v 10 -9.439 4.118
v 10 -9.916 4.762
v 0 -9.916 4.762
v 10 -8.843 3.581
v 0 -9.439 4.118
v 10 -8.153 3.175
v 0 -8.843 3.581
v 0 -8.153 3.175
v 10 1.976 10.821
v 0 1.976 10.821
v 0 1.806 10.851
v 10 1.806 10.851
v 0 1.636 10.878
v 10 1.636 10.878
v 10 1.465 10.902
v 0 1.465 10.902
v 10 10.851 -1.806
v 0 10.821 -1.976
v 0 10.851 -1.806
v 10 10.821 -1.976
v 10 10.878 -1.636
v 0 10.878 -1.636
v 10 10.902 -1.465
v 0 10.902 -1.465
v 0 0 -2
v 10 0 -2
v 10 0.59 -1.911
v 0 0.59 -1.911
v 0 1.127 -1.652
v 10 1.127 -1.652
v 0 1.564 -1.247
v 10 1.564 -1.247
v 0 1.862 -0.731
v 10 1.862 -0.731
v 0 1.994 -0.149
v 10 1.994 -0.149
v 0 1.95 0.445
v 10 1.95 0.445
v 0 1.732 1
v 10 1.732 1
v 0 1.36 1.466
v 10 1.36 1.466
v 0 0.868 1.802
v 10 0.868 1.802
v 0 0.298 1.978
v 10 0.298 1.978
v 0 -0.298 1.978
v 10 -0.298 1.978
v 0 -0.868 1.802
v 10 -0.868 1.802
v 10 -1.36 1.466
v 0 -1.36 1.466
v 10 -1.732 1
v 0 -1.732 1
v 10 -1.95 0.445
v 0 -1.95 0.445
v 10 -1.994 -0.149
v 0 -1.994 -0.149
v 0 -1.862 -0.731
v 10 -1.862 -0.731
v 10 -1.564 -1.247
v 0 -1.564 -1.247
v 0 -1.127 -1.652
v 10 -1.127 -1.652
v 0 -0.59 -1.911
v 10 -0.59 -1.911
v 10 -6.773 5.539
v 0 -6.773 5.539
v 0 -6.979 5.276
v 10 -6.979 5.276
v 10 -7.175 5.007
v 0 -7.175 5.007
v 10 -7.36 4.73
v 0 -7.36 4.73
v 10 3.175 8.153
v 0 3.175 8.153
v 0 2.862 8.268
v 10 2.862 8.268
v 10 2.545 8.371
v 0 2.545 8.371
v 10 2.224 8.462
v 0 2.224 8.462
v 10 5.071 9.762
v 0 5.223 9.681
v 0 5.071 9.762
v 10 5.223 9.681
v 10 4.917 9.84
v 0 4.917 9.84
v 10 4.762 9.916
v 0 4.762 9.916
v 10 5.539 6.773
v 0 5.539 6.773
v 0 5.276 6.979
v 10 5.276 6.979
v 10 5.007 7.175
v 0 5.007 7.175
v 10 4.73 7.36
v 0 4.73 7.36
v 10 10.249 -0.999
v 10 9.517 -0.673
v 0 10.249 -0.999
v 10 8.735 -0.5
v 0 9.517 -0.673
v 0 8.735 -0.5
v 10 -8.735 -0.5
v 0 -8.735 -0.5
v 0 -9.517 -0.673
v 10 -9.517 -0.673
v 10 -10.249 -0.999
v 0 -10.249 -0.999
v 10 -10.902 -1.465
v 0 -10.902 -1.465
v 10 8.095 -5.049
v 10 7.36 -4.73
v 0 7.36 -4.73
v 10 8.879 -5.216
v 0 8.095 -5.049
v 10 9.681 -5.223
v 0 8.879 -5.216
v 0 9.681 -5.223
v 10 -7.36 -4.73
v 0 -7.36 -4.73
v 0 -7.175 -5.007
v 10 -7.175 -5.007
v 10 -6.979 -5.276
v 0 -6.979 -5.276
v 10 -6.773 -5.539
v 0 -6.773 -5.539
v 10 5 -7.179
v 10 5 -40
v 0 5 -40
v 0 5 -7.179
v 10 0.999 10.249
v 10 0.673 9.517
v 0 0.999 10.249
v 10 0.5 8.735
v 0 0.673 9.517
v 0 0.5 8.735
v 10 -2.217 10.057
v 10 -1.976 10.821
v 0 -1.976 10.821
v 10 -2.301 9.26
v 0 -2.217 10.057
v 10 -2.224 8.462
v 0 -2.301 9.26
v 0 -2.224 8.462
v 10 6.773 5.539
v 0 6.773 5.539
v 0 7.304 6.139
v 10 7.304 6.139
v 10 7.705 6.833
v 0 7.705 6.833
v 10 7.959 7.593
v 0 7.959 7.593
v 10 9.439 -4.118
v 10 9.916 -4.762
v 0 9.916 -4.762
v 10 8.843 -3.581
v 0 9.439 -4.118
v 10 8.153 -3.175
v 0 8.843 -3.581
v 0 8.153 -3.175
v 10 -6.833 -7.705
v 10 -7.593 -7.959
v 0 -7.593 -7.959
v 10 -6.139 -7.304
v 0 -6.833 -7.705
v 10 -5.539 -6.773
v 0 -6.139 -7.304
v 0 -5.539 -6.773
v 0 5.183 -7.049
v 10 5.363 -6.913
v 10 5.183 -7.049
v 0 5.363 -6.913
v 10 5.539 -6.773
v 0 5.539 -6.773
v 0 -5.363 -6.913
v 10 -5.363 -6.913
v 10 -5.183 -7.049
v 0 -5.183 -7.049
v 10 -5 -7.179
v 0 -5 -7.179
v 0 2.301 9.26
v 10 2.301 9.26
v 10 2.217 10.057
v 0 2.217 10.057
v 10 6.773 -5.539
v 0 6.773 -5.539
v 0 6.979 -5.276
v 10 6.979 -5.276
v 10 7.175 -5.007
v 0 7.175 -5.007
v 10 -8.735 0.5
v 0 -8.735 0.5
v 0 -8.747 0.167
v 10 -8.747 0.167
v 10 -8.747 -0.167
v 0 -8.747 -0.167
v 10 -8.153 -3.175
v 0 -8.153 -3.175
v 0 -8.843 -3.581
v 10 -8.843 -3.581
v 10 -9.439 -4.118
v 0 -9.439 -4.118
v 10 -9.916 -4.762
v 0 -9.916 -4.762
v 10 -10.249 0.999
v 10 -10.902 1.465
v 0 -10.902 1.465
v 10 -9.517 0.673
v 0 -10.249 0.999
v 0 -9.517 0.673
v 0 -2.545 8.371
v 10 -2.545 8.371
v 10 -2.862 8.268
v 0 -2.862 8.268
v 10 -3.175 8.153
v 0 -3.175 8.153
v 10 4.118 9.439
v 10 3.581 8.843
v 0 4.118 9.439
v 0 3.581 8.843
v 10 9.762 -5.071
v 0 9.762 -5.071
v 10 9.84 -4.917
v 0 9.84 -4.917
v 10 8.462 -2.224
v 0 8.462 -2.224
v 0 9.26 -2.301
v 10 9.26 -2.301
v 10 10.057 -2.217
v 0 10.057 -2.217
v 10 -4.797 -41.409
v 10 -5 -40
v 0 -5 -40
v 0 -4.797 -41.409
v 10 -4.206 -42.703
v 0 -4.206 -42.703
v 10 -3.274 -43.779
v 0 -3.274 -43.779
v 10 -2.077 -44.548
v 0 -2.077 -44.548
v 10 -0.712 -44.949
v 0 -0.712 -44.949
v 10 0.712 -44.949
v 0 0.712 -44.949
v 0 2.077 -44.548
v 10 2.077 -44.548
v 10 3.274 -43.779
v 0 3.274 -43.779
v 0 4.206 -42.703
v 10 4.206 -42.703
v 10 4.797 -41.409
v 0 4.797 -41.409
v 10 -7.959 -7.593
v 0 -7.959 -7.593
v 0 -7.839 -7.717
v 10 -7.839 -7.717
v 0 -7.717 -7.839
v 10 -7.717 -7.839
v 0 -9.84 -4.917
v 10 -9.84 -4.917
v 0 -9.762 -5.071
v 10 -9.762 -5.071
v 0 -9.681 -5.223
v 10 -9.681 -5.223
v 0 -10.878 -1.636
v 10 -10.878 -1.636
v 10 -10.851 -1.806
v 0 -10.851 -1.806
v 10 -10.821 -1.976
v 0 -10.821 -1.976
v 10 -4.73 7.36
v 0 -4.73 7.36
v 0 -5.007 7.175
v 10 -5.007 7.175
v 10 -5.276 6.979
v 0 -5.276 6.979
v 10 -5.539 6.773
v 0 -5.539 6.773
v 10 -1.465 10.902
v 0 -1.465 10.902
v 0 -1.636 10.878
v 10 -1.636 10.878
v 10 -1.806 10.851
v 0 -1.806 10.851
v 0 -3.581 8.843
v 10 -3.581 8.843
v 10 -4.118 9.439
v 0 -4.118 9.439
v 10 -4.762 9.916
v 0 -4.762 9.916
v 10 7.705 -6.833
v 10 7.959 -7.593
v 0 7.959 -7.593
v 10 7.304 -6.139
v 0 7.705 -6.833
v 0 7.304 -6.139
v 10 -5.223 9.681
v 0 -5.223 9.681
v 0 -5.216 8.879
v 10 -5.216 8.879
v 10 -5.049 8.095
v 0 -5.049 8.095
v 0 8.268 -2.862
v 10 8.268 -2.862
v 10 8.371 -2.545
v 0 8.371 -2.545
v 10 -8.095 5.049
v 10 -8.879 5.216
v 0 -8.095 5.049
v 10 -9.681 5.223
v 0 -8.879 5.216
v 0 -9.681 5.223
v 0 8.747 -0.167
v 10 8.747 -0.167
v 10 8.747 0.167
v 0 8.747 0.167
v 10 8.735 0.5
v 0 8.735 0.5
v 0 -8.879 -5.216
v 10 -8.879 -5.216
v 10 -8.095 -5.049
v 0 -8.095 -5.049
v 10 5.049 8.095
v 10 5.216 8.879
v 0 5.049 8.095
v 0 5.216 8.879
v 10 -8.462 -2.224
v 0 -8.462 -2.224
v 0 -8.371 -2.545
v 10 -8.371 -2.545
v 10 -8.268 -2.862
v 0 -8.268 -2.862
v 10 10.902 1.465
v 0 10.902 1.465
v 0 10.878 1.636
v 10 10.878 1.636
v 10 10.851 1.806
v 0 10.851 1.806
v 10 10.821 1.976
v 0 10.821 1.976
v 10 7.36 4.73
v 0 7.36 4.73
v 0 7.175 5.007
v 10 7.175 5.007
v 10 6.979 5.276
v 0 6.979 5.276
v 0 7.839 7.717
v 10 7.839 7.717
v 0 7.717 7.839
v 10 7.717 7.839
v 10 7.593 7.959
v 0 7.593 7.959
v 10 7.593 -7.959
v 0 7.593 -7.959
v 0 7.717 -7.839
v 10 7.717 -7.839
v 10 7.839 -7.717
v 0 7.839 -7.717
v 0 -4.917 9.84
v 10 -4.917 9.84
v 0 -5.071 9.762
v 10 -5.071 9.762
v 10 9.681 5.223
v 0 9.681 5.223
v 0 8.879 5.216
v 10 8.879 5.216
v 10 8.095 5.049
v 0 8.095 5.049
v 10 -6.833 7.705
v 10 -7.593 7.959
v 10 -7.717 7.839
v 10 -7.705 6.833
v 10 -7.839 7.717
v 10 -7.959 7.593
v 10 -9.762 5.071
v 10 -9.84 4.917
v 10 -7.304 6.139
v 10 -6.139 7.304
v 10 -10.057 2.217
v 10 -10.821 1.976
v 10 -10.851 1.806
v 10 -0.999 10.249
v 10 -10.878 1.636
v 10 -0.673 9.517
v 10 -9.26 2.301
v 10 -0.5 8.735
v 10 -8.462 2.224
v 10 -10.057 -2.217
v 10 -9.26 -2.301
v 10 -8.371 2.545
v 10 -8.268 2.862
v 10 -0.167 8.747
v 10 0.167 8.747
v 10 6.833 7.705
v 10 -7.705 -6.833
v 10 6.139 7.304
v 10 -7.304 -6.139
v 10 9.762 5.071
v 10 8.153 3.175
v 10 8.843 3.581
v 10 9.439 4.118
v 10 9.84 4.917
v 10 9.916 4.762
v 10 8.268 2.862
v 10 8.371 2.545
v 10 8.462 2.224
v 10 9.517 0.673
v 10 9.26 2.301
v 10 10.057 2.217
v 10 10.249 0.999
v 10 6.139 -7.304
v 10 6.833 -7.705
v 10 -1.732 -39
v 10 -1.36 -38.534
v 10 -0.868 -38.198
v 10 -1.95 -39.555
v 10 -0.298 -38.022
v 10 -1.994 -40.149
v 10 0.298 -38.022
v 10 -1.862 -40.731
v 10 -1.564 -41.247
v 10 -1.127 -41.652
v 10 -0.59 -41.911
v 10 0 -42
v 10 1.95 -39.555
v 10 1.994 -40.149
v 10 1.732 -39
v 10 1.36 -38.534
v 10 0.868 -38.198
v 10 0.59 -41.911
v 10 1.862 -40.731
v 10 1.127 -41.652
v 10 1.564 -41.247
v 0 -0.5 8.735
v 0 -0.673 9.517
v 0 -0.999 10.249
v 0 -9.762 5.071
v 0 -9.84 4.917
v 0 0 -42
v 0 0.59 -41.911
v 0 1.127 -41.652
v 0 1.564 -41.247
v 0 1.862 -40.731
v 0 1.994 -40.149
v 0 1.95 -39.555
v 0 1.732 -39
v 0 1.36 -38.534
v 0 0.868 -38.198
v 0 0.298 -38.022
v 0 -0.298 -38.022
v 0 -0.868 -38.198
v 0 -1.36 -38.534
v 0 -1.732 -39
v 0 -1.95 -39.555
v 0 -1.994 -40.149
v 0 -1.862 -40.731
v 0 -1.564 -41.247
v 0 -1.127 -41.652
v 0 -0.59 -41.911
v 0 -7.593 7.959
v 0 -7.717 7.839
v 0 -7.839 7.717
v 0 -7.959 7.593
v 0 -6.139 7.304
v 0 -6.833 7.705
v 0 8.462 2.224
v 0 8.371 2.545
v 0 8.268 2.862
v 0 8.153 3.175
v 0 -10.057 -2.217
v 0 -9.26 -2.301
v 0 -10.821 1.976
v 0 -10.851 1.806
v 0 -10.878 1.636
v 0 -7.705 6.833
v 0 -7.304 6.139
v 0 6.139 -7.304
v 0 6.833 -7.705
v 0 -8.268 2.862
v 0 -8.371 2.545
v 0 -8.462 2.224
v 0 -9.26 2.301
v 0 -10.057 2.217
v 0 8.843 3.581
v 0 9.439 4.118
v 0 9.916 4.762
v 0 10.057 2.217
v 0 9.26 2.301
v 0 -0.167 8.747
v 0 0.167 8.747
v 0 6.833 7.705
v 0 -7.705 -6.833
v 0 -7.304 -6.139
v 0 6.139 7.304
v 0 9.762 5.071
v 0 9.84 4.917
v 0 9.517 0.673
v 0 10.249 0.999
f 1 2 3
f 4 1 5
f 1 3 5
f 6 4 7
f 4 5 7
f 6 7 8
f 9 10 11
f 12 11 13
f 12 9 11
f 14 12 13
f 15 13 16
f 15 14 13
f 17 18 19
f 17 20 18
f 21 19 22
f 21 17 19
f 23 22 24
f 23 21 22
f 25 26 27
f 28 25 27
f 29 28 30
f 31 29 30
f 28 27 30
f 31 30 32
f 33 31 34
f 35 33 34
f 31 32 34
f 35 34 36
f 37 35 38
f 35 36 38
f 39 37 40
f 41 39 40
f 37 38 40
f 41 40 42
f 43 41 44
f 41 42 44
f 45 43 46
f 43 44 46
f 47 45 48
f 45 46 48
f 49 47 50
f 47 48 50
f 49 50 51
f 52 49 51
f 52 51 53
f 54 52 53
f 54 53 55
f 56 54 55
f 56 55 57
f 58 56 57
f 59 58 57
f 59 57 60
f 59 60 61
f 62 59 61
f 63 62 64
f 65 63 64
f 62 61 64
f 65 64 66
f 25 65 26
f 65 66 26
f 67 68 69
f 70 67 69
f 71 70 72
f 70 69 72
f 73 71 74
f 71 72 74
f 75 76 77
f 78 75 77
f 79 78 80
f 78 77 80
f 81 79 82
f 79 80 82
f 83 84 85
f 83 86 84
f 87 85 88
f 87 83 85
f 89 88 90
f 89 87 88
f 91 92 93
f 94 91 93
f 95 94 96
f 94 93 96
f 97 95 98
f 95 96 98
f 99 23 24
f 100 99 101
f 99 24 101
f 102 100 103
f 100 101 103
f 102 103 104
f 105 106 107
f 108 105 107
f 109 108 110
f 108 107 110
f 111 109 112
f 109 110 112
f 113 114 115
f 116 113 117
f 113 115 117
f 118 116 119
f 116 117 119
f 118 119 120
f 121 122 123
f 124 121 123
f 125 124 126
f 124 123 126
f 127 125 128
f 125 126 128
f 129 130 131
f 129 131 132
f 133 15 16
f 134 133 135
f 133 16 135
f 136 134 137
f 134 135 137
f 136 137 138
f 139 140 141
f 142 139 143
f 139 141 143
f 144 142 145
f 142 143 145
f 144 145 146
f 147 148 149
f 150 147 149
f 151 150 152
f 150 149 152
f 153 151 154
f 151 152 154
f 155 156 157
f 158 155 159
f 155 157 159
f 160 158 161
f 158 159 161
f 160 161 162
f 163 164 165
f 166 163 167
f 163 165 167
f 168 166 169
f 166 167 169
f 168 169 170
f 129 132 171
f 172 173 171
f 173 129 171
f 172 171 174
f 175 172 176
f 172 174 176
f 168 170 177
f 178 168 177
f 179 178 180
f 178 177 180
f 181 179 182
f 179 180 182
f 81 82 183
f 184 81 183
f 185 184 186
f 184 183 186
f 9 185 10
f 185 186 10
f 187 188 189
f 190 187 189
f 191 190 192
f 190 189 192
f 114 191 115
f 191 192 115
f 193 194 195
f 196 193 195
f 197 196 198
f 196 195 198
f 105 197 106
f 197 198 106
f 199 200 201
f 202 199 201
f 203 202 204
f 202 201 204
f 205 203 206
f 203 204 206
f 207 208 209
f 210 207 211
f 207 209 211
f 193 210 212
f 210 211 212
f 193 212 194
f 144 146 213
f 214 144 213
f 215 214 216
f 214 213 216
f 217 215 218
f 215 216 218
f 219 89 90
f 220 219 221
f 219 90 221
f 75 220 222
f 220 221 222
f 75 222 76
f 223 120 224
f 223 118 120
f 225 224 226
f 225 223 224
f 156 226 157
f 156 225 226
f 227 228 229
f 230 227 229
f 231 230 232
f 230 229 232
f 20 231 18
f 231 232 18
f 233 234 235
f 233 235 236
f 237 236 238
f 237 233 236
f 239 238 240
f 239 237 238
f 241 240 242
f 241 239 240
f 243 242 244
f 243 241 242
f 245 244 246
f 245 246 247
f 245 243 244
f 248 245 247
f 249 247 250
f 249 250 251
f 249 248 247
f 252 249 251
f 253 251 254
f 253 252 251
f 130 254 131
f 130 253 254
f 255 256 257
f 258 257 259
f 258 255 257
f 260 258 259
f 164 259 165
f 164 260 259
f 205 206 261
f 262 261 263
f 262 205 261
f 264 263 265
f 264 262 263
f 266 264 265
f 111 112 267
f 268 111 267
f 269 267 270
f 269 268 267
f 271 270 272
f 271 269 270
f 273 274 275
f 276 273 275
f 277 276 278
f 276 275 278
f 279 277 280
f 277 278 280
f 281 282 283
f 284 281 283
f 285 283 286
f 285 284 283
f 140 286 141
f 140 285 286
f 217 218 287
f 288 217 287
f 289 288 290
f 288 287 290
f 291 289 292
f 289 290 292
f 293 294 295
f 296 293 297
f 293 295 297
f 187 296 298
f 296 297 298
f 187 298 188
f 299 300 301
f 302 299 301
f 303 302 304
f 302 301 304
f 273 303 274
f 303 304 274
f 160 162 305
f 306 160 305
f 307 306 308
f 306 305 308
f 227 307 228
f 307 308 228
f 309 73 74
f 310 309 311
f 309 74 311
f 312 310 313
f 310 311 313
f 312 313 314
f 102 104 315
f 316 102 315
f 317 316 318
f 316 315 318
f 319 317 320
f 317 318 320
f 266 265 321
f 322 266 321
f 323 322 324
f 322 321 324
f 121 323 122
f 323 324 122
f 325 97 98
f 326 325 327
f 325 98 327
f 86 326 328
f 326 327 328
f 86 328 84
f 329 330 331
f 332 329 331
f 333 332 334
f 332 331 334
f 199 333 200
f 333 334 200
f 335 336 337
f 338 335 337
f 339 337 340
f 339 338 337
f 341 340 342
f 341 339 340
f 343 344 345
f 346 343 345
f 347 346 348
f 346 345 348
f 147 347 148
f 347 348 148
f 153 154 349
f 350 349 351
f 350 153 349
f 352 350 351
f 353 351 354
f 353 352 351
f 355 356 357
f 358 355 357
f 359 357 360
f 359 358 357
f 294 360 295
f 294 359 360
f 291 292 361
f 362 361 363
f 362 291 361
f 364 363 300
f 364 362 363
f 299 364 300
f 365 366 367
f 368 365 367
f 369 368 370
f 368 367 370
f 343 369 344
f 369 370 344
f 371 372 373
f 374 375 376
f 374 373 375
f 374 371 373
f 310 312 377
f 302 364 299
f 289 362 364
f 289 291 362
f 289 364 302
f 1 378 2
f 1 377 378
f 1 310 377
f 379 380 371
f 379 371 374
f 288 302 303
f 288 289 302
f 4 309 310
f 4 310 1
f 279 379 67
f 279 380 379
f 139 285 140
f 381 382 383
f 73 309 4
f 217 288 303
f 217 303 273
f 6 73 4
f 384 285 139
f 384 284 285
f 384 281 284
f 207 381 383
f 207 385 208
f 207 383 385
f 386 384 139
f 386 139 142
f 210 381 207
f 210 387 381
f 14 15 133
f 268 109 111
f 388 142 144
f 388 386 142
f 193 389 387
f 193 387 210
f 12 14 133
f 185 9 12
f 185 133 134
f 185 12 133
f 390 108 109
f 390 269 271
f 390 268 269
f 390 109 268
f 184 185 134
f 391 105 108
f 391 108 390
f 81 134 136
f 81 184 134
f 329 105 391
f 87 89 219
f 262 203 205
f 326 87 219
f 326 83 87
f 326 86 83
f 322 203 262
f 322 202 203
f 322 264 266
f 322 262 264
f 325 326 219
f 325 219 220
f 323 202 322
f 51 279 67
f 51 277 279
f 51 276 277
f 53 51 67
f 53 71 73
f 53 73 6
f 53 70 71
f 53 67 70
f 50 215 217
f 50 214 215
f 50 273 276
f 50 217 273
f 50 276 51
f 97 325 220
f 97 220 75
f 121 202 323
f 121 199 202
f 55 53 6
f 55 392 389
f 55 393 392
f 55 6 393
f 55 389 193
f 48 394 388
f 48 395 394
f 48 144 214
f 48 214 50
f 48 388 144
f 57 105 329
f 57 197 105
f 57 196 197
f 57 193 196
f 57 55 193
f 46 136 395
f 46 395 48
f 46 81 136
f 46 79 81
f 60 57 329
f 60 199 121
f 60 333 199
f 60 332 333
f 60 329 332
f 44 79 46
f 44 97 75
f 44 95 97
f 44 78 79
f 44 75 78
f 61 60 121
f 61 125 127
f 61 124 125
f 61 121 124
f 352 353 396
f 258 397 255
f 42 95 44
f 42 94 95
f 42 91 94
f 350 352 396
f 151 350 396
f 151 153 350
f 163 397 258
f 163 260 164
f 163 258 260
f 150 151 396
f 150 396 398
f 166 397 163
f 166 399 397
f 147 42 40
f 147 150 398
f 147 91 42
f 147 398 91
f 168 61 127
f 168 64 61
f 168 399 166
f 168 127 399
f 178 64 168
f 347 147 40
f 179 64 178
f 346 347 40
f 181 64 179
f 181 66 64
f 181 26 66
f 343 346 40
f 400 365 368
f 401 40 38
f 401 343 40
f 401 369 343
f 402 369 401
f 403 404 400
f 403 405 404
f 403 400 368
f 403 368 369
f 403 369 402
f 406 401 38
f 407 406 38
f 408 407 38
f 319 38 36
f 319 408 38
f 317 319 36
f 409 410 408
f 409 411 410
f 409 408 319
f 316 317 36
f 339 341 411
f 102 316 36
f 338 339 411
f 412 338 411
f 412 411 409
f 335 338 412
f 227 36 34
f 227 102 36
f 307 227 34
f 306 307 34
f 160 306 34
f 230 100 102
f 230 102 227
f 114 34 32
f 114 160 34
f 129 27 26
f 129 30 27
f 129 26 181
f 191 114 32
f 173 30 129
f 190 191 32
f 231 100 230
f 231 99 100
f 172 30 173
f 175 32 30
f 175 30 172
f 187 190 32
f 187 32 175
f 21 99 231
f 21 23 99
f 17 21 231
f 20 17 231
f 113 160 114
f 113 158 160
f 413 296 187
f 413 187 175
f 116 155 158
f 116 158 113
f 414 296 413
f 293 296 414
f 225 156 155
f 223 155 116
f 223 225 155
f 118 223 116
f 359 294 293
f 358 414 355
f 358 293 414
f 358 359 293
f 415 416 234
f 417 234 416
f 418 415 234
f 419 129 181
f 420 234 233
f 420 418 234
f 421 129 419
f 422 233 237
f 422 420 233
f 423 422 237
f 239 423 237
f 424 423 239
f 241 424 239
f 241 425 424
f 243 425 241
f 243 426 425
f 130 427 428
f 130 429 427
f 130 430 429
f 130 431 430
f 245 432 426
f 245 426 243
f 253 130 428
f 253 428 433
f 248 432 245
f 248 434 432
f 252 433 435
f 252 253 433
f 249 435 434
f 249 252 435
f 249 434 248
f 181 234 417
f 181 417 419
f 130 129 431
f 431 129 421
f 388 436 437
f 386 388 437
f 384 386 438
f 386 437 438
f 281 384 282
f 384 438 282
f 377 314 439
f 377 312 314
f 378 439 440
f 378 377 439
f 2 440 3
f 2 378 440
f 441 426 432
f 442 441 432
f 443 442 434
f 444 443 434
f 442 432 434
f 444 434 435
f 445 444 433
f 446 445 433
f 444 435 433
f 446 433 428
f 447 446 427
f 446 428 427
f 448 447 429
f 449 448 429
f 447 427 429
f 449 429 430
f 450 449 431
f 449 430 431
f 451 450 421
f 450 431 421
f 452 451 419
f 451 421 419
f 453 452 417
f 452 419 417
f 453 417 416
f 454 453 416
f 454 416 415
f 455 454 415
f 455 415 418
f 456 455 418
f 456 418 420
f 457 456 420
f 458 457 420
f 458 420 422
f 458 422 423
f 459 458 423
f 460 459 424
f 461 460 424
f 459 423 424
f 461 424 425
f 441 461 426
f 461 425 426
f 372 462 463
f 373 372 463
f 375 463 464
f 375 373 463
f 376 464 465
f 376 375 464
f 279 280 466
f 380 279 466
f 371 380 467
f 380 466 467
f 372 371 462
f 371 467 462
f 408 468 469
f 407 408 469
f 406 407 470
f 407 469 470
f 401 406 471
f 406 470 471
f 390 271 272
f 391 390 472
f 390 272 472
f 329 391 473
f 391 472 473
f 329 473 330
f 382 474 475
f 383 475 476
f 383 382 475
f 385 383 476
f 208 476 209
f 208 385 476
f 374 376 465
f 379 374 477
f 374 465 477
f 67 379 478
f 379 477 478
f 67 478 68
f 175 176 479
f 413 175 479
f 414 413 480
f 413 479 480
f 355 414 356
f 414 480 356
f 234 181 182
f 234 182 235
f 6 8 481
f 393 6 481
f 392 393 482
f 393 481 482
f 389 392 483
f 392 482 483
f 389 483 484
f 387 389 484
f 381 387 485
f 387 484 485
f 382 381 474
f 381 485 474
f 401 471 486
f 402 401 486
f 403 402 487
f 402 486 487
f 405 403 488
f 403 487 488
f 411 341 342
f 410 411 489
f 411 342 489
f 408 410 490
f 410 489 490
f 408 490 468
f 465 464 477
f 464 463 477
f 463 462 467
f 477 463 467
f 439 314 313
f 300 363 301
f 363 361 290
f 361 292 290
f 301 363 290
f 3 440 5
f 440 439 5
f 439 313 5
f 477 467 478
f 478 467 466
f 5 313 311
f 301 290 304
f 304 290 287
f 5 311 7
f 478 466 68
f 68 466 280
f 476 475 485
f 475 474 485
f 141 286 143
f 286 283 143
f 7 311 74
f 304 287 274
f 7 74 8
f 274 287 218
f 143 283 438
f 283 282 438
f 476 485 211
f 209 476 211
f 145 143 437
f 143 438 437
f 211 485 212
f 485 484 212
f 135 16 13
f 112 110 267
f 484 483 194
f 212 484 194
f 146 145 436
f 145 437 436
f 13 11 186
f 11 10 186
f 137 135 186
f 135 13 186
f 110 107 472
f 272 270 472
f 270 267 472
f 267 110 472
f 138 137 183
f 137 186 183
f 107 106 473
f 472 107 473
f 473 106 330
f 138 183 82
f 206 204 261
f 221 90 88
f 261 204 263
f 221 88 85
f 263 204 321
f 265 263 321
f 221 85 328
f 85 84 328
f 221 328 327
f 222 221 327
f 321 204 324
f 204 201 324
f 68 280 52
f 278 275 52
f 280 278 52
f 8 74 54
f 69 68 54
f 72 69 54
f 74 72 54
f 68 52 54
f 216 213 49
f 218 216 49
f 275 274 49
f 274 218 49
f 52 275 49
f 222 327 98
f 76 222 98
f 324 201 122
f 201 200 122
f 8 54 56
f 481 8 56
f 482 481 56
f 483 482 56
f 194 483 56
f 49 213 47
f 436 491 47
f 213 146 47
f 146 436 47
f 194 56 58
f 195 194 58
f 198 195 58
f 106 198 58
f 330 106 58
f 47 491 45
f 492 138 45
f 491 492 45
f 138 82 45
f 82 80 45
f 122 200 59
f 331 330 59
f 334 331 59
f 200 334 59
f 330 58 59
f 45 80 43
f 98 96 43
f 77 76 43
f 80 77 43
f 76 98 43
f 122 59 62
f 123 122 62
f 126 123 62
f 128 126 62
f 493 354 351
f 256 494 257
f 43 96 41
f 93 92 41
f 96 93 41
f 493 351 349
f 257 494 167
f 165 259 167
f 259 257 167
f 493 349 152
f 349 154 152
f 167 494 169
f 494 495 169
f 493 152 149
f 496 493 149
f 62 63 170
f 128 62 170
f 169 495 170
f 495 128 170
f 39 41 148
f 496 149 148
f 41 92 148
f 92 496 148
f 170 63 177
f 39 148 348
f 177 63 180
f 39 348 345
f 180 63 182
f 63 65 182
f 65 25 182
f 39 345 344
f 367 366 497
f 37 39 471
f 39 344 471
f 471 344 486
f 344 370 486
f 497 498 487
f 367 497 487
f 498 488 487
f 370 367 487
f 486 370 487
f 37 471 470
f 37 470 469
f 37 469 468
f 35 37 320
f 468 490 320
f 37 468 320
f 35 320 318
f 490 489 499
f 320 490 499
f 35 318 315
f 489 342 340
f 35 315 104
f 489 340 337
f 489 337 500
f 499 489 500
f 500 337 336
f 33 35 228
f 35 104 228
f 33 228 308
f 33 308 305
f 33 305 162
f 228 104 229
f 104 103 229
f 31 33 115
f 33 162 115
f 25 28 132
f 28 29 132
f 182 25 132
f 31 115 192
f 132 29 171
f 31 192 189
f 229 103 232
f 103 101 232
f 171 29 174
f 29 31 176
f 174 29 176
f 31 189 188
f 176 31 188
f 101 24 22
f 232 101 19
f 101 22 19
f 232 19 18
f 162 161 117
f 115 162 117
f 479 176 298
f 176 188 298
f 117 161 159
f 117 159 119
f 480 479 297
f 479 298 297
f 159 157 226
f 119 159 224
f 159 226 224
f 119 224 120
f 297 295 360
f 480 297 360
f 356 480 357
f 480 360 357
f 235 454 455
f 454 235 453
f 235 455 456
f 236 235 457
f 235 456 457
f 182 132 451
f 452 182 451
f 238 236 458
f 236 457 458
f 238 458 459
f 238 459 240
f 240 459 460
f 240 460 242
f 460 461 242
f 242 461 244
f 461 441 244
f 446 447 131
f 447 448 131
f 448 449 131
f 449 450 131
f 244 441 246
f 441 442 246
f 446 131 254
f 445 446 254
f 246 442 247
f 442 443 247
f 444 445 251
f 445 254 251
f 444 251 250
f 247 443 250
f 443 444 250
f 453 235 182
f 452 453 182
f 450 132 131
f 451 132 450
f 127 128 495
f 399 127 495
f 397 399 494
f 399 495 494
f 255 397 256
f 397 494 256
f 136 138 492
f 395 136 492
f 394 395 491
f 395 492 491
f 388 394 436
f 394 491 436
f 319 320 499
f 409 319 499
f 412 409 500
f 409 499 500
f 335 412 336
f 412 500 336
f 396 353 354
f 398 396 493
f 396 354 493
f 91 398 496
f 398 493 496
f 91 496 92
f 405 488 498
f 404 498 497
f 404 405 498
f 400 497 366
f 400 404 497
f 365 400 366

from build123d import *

# Parameters (mm, degrees)
BASPROSKE_W             = 10
BASPROSKE_H             = 11
TOOTHCUT_DEPTH          = 19.493242009
TEETHCUTS_COUNT         = 20
TEETHCUTS_ANGLE         = 342
BORSKE_R                = 0.4
BORE_DEPTH              = 50.0000508
CROQUIS1_R              = 2
SALIENTE_EXTRUIR1_DEPTH = 10
CROQUIS2_R              = 2
CORTAR_EXTRUIR1_DEPTH   = 10
CORTAR_EXTRUIR2_DEPTH   = 10


with BuildPart() as part:
    # BasProSke → Base-Revolve (revolve)
    with BuildSketch(Plane(origin=(0, 0, 0), x_dir=(1, 0, 0), z_dir=(0, 1, 0)), mode=Mode.PRIVATE) as base_revolve_sk:
        with Locations((5, 5.5)):
            Rectangle(BASPROSKE_W, BASPROSKE_H)
    revolve(base_revolve_sk.sketch.rotate(Axis((-10, 0, 0), (1, 0, 0)), 180), axis=Axis((-10, 0, 0), (1, 0, 0)))

    # TooCutSke → ToothCut (cut, through all)
    with BuildSketch(Plane(origin=(0, 0, 0), x_dir=(0, 0, -1), z_dir=(1, 0, 0))):
        with BuildLine():
            ThreePointArc((0.499924007, 8.734705318), (0, 8.749), (-0.499924007, 8.734705318))
            ThreePointArc((-0.499924007, 8.734705318), (-0.824302243, 9.905497836), (-1.485192705, 10.924909509))
            ThreePointArc((-1.485192705, 10.924909509), (0, 11.0254), (1.485192705, 10.924909509))
            ThreePointArc((1.485192705, 10.924909509), (0.824302243, 9.905497836), (0.499924007, 8.734705318))
        make_face()
    toothcut = extrude(amount=TOOTHCUT_DEPTH, mode=Mode.SUBTRACT)

    # TeethCuts: ToothCut ×20 about axis
    teethcuts_axis = Axis((-10, 0, 0), (1, 0, 0))
    for i in range(1, TEETHCUTS_COUNT):
        add(toothcut.rotate(teethcuts_axis, i * TEETHCUTS_ANGLE / (TEETHCUTS_COUNT - 1)), mode=Mode.SUBTRACT)

    # BorSke → Bore (cut, symmetric)
    with BuildSketch(Plane(origin=(0, 0, 0), x_dir=(0, 0, -1), z_dir=(1, 0, 0))):
        with Locations(Location((0, 0, 0), (0, 0, 180))):
            Circle(BORSKE_R)
    extrude(amount=BORE_DEPTH, both=True, mode=Mode.SUBTRACT)

    # Croquis1 → Saliente-Extruir1 (add)
    with BuildSketch(Plane(origin=(10, 0, 0), x_dir=(0, 0, -1), z_dir=(1, 0, 0))):
        with BuildLine():
            Line((40, 5), (0, 5))
            ThreePointArc((0, 5), (-5, 0), (0, -5))
            Line((0, -5), (40, -5))
            ThreePointArc((40, -5), (45, 0), (40, 5))
        make_face()
        Circle(CROQUIS1_R, mode=Mode.SUBTRACT)
        with Locations((40, 0)):
            Circle(CROQUIS1_R, mode=Mode.SUBTRACT)
    extrude(amount=-SALIENTE_EXTRUIR1_DEPTH)

    # Croquis2 → Cortar-Extruir1 (cut)
    with BuildSketch(Plane(origin=(10, 0, 0), x_dir=(0, 0, -1), z_dir=(1, 0, 0))):
        Circle(CROQUIS2_R)
    extrude(amount=-CORTAR_EXTRUIR1_DEPTH, mode=Mode.SUBTRACT)

    # Croquis3 → Cortar-Extruir2 (cut)
    with BuildSketch(Plane(origin=(10, 0, 0), x_dir=(0, 0, -1), z_dir=(1, 0, 0))):
        with BuildLine():
            Line((6.772677084, 5.538577987), (8.515195785, 6.963579593))
            ThreePointArc((8.515195785, 6.963579593), (9.209061868, 6.016076754), (9.797958971, 5))
            Line((9.797958971, 5), (7.179484731, 5))
            ThreePointArc((7.179484731, 5), (6.981276487, 5.273213405), (6.772677084, 5.538577987))
        make_face()
        with BuildLine():
            Line((6.772677084, -5.538577987), (8.515195785, -6.963579593))
            ThreePointArc((8.515195785, -6.963579593), (9.209061868, -6.016076754), (9.797958971, -5))
            Line((9.797958971, -5), (7.179484731, -5))
            ThreePointArc((7.179484731, -5), (6.981276487, -5.273213405), (6.772677084, -5.538577987))
        make_face()
    extrude(amount=-CORTAR_EXTRUIR2_DEPTH, mode=Mode.SUBTRACT)


solid = part.part
